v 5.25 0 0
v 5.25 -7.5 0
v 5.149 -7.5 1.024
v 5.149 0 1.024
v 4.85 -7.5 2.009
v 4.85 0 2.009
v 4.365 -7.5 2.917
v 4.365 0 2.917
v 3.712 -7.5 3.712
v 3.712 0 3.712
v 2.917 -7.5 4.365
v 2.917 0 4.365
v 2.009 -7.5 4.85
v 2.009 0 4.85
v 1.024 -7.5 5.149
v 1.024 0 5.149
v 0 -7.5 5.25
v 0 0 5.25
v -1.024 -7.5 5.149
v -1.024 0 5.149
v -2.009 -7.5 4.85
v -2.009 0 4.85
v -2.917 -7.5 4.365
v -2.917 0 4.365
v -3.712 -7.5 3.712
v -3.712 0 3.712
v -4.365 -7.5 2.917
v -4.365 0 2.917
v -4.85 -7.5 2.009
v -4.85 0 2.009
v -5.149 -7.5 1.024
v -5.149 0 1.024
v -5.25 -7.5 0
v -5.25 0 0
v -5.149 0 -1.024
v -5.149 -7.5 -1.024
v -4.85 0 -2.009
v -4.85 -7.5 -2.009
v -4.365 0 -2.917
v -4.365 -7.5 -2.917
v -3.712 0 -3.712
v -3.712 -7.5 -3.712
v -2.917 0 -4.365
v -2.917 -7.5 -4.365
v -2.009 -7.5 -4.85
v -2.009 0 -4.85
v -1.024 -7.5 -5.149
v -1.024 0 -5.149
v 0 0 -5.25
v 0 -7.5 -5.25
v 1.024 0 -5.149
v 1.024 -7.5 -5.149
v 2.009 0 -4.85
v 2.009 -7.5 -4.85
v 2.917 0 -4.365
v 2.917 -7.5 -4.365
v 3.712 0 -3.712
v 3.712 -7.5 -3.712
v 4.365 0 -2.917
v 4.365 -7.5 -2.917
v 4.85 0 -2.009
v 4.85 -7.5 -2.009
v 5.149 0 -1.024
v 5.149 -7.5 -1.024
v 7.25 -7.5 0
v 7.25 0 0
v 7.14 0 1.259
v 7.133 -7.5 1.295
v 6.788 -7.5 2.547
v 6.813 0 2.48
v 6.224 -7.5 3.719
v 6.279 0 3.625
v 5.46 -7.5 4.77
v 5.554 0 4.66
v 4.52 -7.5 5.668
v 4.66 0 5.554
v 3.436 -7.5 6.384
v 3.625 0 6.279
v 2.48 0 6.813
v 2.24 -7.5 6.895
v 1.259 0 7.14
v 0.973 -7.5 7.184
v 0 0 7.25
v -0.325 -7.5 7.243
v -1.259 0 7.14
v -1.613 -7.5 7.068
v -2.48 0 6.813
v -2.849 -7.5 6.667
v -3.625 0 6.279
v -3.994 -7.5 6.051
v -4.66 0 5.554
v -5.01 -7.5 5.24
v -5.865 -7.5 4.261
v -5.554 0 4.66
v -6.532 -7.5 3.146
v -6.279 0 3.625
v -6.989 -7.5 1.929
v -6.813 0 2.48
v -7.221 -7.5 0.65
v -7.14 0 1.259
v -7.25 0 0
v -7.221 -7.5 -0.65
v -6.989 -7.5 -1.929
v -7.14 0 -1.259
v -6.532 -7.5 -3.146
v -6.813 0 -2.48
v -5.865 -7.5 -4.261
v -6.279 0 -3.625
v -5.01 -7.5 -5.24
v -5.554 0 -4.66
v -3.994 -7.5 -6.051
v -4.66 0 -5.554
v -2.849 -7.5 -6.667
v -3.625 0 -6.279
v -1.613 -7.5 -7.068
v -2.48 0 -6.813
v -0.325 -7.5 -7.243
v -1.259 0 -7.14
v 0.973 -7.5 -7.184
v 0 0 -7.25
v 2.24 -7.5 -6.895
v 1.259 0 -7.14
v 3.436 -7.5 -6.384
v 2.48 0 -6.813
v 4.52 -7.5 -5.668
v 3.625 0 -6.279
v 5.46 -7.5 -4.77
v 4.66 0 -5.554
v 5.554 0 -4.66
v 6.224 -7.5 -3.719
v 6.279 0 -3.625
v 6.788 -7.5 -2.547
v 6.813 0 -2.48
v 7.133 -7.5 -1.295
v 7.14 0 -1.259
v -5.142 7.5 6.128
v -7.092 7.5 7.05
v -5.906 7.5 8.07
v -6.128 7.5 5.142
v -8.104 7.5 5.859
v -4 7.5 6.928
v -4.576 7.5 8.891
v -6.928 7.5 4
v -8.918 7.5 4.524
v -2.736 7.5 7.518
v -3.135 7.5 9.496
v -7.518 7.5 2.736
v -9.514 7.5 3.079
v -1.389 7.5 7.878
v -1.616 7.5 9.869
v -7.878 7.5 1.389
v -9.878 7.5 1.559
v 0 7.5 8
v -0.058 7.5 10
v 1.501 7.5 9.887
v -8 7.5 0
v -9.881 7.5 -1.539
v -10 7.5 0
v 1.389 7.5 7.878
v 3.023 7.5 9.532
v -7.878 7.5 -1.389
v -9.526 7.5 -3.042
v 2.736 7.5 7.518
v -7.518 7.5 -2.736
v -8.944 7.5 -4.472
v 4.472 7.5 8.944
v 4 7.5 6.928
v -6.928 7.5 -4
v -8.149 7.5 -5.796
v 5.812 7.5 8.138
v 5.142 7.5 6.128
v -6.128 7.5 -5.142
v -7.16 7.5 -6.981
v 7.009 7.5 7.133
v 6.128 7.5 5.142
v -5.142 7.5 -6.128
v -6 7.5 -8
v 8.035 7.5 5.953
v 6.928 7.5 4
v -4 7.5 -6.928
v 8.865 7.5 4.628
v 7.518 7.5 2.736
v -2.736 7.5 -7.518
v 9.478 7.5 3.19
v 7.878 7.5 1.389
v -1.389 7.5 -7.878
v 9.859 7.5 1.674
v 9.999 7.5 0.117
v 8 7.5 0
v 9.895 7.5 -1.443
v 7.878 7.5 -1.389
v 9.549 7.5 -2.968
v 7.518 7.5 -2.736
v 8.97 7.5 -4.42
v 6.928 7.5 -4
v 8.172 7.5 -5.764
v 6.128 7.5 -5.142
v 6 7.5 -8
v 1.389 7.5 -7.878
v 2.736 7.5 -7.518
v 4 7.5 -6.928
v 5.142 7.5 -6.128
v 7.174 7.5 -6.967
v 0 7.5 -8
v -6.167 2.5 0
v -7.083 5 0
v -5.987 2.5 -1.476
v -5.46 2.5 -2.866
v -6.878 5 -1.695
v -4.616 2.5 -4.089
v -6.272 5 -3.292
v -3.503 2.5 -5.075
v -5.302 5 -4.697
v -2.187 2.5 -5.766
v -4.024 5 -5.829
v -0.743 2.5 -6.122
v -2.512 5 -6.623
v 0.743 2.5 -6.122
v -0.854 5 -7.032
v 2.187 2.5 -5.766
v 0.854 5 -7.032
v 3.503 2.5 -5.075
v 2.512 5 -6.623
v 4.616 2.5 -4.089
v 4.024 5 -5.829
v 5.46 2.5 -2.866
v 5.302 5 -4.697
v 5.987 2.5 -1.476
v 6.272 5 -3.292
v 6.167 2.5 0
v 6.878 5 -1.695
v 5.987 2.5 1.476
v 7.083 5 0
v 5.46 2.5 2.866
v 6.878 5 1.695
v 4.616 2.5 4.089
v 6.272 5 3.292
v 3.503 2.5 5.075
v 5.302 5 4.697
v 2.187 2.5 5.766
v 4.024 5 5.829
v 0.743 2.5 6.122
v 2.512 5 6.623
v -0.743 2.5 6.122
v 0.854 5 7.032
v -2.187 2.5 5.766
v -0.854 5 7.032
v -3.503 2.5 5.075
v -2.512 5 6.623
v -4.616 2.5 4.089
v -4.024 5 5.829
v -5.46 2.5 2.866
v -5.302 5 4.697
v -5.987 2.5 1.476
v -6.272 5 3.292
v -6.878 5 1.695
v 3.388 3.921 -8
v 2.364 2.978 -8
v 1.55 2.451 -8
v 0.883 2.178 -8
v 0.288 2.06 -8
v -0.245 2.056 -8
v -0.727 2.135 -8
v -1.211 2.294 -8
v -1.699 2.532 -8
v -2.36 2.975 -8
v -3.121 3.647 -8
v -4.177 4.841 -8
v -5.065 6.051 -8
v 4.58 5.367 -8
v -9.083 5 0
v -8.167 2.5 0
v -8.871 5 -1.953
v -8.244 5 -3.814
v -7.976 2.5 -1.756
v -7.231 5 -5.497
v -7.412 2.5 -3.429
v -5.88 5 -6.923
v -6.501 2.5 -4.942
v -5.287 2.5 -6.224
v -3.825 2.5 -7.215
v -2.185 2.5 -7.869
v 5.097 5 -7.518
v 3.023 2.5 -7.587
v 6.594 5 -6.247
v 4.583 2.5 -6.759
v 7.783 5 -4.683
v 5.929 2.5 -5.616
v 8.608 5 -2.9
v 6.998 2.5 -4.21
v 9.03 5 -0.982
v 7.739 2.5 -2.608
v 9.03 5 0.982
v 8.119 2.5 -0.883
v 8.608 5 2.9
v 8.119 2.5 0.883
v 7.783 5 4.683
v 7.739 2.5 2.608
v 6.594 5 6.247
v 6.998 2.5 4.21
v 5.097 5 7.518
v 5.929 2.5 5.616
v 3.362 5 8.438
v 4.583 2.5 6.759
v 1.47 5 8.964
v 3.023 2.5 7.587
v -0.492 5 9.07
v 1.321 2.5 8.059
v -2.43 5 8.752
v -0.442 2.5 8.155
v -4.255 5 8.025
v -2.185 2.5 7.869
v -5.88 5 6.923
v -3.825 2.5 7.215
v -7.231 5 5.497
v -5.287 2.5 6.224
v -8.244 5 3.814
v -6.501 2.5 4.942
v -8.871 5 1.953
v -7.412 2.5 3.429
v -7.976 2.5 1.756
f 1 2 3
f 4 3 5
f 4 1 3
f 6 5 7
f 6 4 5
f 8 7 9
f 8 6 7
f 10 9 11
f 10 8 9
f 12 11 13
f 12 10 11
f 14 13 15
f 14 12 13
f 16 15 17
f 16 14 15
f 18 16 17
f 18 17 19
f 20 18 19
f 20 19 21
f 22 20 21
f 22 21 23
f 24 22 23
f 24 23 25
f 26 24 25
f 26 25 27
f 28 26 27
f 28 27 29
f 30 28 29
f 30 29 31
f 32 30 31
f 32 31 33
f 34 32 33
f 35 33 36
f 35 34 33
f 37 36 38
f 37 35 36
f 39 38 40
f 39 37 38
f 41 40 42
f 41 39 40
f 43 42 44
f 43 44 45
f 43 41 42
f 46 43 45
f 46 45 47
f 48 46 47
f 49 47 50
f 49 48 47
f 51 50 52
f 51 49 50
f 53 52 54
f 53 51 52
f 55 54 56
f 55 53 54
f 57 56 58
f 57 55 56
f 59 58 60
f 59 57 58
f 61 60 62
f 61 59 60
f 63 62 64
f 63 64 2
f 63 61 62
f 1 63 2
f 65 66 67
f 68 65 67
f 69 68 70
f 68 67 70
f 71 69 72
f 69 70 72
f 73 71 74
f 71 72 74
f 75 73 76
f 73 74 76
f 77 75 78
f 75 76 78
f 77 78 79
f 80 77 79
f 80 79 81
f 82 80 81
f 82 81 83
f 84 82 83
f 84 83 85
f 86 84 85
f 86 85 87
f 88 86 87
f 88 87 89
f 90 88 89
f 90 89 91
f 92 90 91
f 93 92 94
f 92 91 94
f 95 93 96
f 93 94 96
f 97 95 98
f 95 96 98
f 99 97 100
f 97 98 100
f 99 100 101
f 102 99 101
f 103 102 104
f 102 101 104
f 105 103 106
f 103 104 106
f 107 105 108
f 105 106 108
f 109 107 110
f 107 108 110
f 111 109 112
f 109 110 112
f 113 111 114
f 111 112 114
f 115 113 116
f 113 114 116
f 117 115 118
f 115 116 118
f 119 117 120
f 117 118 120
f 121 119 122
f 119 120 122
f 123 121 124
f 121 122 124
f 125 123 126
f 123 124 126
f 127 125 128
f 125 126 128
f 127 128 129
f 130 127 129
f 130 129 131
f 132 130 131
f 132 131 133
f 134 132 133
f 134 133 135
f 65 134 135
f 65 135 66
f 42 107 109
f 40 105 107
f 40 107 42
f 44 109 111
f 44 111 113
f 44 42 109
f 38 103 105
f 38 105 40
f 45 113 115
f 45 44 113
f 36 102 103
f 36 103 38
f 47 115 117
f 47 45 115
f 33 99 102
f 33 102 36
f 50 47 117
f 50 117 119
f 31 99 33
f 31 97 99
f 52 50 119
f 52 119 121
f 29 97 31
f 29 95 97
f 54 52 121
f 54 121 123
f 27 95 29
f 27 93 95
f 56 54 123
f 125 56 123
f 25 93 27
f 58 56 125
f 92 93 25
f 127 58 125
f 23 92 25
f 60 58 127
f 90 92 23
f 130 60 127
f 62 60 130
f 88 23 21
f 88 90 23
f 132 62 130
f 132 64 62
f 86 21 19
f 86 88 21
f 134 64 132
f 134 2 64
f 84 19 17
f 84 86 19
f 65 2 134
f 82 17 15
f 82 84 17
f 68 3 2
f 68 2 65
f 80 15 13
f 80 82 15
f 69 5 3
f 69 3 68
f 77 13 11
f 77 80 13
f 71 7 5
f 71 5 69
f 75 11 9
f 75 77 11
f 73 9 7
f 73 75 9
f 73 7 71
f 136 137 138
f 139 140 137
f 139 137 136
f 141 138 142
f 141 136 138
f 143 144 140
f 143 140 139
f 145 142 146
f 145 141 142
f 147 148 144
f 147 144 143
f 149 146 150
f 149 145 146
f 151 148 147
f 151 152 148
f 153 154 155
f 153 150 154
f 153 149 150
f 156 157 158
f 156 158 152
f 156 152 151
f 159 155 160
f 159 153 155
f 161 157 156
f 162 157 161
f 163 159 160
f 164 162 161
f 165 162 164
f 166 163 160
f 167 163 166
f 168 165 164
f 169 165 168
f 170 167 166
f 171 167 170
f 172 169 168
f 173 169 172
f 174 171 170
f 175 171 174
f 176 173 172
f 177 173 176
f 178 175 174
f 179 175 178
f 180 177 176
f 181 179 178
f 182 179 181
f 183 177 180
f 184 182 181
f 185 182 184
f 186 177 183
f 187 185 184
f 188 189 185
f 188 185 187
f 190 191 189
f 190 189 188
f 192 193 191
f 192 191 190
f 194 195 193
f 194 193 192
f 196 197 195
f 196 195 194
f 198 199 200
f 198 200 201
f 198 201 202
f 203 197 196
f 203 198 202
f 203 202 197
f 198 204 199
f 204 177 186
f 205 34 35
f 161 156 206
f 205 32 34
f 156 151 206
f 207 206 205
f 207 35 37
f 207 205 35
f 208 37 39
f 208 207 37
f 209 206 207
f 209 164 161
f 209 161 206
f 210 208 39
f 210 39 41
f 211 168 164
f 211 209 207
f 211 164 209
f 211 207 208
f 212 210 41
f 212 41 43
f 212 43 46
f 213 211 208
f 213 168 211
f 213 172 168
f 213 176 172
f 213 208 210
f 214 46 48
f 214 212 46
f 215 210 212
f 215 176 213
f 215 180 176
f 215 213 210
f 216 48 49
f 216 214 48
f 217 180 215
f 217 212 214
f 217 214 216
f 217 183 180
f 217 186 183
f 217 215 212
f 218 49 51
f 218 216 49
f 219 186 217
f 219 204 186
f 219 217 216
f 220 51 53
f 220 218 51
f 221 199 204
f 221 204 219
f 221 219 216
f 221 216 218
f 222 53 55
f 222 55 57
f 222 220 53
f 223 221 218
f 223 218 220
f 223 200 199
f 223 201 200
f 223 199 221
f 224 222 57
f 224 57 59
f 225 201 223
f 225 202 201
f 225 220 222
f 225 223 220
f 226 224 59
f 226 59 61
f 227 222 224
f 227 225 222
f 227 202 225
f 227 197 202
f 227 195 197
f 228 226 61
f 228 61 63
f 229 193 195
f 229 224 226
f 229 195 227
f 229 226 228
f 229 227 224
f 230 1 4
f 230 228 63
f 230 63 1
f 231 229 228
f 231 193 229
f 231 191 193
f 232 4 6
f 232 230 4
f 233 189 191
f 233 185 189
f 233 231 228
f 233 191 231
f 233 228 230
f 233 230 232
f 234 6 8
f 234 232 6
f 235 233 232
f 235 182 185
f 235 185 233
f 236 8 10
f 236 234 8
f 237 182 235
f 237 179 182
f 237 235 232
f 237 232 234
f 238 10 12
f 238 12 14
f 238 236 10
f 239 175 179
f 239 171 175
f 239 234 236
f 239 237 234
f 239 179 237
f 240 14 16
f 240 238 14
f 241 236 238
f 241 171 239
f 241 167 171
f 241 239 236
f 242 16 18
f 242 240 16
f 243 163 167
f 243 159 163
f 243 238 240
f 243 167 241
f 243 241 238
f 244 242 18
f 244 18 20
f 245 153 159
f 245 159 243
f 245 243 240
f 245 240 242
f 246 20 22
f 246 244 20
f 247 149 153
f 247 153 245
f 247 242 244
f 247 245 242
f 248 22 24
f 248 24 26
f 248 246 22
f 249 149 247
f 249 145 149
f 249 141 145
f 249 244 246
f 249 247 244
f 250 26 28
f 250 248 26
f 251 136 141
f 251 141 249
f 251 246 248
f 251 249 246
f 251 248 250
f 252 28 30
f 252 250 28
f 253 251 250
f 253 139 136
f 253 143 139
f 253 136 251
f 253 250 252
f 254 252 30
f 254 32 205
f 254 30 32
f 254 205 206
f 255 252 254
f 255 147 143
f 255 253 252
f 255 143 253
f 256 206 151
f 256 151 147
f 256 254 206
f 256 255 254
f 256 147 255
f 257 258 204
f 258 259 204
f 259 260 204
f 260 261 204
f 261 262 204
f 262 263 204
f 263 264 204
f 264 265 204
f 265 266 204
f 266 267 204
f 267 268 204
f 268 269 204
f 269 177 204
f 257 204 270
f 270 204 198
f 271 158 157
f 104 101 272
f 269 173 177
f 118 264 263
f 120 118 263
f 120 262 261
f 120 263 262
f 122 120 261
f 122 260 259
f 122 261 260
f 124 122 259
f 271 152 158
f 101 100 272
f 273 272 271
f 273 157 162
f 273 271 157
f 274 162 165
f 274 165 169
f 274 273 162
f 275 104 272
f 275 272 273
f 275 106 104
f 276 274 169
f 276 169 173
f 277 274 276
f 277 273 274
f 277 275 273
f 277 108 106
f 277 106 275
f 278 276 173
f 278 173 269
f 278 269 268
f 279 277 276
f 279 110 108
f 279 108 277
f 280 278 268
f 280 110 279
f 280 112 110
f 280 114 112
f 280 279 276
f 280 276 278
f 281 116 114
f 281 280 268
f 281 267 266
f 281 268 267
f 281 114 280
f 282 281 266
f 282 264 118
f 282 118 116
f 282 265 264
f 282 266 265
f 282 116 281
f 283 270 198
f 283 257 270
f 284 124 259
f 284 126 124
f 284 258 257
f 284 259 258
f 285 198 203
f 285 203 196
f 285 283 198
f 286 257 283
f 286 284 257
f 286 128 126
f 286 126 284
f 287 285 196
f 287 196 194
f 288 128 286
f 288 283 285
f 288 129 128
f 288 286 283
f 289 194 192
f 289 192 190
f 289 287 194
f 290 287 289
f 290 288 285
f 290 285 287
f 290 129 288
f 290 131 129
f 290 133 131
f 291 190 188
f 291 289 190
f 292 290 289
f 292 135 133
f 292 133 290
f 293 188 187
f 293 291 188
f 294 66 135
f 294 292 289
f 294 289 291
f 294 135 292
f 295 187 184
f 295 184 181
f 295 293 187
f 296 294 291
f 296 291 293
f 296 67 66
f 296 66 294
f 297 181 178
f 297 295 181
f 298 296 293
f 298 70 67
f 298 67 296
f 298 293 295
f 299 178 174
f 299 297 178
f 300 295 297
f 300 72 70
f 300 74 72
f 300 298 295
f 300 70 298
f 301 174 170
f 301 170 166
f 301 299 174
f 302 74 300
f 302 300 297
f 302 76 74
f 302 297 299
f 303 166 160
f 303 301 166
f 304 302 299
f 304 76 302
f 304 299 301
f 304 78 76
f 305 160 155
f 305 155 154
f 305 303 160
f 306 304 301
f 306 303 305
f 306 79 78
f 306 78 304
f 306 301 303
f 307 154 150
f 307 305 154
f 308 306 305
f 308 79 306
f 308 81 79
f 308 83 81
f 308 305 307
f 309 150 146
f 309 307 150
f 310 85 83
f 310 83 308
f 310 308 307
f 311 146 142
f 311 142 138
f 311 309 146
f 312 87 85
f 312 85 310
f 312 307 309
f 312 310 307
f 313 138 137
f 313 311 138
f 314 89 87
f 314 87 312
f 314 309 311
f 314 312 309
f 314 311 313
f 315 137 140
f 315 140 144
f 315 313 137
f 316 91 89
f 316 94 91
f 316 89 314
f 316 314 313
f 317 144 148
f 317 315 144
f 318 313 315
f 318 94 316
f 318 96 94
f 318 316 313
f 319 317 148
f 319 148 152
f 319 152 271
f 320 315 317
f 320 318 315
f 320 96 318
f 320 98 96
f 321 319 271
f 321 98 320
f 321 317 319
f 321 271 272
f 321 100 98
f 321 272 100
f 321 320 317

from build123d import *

# Parameters (mm, degrees)
CROQUIS2_R              = 7.25
CROQUIS2_R_2            = 5.25
SALIENTE_EXTRUIR1_DEPTH = 7.5
CORTAR_EXTRUIR1_DEPTH   = 7.5


with BuildPart() as part:
    # Croquis1 → Revolución1 (revolve)
    with BuildSketch(Plane.XY):
        Polygon((-5.25, 0), (-8, 7.5), (-10, 7.5), (-7.25, 0), align=None)
    revolve(axis=Axis((0, 7.5, 0), (0, -1, 0)))

    # Croquis2 → Saliente-Extruir1 (add)
    with BuildSketch(Plane.XZ):
        Circle(CROQUIS2_R)
        Circle(CROQUIS2_R_2, mode=Mode.SUBTRACT)
    extrude(amount=SALIENTE_EXTRUIR1_DEPTH)

    # Croquis4 → Cortar-Extruir1 (cut)
    with BuildSketch(Plane(origin=(0, 7.5, 0), x_dir=(1, 0, 0), z_dir=(0, 1, 0))):
        Polygon((-8.604100246, 8), (8.604100246, 8), (0, 12.592023512), align=None)
    extrude(amount=-CORTAR_EXTRUIR1_DEPTH, mode=Mode.SUBTRACT)


solid = part.part
